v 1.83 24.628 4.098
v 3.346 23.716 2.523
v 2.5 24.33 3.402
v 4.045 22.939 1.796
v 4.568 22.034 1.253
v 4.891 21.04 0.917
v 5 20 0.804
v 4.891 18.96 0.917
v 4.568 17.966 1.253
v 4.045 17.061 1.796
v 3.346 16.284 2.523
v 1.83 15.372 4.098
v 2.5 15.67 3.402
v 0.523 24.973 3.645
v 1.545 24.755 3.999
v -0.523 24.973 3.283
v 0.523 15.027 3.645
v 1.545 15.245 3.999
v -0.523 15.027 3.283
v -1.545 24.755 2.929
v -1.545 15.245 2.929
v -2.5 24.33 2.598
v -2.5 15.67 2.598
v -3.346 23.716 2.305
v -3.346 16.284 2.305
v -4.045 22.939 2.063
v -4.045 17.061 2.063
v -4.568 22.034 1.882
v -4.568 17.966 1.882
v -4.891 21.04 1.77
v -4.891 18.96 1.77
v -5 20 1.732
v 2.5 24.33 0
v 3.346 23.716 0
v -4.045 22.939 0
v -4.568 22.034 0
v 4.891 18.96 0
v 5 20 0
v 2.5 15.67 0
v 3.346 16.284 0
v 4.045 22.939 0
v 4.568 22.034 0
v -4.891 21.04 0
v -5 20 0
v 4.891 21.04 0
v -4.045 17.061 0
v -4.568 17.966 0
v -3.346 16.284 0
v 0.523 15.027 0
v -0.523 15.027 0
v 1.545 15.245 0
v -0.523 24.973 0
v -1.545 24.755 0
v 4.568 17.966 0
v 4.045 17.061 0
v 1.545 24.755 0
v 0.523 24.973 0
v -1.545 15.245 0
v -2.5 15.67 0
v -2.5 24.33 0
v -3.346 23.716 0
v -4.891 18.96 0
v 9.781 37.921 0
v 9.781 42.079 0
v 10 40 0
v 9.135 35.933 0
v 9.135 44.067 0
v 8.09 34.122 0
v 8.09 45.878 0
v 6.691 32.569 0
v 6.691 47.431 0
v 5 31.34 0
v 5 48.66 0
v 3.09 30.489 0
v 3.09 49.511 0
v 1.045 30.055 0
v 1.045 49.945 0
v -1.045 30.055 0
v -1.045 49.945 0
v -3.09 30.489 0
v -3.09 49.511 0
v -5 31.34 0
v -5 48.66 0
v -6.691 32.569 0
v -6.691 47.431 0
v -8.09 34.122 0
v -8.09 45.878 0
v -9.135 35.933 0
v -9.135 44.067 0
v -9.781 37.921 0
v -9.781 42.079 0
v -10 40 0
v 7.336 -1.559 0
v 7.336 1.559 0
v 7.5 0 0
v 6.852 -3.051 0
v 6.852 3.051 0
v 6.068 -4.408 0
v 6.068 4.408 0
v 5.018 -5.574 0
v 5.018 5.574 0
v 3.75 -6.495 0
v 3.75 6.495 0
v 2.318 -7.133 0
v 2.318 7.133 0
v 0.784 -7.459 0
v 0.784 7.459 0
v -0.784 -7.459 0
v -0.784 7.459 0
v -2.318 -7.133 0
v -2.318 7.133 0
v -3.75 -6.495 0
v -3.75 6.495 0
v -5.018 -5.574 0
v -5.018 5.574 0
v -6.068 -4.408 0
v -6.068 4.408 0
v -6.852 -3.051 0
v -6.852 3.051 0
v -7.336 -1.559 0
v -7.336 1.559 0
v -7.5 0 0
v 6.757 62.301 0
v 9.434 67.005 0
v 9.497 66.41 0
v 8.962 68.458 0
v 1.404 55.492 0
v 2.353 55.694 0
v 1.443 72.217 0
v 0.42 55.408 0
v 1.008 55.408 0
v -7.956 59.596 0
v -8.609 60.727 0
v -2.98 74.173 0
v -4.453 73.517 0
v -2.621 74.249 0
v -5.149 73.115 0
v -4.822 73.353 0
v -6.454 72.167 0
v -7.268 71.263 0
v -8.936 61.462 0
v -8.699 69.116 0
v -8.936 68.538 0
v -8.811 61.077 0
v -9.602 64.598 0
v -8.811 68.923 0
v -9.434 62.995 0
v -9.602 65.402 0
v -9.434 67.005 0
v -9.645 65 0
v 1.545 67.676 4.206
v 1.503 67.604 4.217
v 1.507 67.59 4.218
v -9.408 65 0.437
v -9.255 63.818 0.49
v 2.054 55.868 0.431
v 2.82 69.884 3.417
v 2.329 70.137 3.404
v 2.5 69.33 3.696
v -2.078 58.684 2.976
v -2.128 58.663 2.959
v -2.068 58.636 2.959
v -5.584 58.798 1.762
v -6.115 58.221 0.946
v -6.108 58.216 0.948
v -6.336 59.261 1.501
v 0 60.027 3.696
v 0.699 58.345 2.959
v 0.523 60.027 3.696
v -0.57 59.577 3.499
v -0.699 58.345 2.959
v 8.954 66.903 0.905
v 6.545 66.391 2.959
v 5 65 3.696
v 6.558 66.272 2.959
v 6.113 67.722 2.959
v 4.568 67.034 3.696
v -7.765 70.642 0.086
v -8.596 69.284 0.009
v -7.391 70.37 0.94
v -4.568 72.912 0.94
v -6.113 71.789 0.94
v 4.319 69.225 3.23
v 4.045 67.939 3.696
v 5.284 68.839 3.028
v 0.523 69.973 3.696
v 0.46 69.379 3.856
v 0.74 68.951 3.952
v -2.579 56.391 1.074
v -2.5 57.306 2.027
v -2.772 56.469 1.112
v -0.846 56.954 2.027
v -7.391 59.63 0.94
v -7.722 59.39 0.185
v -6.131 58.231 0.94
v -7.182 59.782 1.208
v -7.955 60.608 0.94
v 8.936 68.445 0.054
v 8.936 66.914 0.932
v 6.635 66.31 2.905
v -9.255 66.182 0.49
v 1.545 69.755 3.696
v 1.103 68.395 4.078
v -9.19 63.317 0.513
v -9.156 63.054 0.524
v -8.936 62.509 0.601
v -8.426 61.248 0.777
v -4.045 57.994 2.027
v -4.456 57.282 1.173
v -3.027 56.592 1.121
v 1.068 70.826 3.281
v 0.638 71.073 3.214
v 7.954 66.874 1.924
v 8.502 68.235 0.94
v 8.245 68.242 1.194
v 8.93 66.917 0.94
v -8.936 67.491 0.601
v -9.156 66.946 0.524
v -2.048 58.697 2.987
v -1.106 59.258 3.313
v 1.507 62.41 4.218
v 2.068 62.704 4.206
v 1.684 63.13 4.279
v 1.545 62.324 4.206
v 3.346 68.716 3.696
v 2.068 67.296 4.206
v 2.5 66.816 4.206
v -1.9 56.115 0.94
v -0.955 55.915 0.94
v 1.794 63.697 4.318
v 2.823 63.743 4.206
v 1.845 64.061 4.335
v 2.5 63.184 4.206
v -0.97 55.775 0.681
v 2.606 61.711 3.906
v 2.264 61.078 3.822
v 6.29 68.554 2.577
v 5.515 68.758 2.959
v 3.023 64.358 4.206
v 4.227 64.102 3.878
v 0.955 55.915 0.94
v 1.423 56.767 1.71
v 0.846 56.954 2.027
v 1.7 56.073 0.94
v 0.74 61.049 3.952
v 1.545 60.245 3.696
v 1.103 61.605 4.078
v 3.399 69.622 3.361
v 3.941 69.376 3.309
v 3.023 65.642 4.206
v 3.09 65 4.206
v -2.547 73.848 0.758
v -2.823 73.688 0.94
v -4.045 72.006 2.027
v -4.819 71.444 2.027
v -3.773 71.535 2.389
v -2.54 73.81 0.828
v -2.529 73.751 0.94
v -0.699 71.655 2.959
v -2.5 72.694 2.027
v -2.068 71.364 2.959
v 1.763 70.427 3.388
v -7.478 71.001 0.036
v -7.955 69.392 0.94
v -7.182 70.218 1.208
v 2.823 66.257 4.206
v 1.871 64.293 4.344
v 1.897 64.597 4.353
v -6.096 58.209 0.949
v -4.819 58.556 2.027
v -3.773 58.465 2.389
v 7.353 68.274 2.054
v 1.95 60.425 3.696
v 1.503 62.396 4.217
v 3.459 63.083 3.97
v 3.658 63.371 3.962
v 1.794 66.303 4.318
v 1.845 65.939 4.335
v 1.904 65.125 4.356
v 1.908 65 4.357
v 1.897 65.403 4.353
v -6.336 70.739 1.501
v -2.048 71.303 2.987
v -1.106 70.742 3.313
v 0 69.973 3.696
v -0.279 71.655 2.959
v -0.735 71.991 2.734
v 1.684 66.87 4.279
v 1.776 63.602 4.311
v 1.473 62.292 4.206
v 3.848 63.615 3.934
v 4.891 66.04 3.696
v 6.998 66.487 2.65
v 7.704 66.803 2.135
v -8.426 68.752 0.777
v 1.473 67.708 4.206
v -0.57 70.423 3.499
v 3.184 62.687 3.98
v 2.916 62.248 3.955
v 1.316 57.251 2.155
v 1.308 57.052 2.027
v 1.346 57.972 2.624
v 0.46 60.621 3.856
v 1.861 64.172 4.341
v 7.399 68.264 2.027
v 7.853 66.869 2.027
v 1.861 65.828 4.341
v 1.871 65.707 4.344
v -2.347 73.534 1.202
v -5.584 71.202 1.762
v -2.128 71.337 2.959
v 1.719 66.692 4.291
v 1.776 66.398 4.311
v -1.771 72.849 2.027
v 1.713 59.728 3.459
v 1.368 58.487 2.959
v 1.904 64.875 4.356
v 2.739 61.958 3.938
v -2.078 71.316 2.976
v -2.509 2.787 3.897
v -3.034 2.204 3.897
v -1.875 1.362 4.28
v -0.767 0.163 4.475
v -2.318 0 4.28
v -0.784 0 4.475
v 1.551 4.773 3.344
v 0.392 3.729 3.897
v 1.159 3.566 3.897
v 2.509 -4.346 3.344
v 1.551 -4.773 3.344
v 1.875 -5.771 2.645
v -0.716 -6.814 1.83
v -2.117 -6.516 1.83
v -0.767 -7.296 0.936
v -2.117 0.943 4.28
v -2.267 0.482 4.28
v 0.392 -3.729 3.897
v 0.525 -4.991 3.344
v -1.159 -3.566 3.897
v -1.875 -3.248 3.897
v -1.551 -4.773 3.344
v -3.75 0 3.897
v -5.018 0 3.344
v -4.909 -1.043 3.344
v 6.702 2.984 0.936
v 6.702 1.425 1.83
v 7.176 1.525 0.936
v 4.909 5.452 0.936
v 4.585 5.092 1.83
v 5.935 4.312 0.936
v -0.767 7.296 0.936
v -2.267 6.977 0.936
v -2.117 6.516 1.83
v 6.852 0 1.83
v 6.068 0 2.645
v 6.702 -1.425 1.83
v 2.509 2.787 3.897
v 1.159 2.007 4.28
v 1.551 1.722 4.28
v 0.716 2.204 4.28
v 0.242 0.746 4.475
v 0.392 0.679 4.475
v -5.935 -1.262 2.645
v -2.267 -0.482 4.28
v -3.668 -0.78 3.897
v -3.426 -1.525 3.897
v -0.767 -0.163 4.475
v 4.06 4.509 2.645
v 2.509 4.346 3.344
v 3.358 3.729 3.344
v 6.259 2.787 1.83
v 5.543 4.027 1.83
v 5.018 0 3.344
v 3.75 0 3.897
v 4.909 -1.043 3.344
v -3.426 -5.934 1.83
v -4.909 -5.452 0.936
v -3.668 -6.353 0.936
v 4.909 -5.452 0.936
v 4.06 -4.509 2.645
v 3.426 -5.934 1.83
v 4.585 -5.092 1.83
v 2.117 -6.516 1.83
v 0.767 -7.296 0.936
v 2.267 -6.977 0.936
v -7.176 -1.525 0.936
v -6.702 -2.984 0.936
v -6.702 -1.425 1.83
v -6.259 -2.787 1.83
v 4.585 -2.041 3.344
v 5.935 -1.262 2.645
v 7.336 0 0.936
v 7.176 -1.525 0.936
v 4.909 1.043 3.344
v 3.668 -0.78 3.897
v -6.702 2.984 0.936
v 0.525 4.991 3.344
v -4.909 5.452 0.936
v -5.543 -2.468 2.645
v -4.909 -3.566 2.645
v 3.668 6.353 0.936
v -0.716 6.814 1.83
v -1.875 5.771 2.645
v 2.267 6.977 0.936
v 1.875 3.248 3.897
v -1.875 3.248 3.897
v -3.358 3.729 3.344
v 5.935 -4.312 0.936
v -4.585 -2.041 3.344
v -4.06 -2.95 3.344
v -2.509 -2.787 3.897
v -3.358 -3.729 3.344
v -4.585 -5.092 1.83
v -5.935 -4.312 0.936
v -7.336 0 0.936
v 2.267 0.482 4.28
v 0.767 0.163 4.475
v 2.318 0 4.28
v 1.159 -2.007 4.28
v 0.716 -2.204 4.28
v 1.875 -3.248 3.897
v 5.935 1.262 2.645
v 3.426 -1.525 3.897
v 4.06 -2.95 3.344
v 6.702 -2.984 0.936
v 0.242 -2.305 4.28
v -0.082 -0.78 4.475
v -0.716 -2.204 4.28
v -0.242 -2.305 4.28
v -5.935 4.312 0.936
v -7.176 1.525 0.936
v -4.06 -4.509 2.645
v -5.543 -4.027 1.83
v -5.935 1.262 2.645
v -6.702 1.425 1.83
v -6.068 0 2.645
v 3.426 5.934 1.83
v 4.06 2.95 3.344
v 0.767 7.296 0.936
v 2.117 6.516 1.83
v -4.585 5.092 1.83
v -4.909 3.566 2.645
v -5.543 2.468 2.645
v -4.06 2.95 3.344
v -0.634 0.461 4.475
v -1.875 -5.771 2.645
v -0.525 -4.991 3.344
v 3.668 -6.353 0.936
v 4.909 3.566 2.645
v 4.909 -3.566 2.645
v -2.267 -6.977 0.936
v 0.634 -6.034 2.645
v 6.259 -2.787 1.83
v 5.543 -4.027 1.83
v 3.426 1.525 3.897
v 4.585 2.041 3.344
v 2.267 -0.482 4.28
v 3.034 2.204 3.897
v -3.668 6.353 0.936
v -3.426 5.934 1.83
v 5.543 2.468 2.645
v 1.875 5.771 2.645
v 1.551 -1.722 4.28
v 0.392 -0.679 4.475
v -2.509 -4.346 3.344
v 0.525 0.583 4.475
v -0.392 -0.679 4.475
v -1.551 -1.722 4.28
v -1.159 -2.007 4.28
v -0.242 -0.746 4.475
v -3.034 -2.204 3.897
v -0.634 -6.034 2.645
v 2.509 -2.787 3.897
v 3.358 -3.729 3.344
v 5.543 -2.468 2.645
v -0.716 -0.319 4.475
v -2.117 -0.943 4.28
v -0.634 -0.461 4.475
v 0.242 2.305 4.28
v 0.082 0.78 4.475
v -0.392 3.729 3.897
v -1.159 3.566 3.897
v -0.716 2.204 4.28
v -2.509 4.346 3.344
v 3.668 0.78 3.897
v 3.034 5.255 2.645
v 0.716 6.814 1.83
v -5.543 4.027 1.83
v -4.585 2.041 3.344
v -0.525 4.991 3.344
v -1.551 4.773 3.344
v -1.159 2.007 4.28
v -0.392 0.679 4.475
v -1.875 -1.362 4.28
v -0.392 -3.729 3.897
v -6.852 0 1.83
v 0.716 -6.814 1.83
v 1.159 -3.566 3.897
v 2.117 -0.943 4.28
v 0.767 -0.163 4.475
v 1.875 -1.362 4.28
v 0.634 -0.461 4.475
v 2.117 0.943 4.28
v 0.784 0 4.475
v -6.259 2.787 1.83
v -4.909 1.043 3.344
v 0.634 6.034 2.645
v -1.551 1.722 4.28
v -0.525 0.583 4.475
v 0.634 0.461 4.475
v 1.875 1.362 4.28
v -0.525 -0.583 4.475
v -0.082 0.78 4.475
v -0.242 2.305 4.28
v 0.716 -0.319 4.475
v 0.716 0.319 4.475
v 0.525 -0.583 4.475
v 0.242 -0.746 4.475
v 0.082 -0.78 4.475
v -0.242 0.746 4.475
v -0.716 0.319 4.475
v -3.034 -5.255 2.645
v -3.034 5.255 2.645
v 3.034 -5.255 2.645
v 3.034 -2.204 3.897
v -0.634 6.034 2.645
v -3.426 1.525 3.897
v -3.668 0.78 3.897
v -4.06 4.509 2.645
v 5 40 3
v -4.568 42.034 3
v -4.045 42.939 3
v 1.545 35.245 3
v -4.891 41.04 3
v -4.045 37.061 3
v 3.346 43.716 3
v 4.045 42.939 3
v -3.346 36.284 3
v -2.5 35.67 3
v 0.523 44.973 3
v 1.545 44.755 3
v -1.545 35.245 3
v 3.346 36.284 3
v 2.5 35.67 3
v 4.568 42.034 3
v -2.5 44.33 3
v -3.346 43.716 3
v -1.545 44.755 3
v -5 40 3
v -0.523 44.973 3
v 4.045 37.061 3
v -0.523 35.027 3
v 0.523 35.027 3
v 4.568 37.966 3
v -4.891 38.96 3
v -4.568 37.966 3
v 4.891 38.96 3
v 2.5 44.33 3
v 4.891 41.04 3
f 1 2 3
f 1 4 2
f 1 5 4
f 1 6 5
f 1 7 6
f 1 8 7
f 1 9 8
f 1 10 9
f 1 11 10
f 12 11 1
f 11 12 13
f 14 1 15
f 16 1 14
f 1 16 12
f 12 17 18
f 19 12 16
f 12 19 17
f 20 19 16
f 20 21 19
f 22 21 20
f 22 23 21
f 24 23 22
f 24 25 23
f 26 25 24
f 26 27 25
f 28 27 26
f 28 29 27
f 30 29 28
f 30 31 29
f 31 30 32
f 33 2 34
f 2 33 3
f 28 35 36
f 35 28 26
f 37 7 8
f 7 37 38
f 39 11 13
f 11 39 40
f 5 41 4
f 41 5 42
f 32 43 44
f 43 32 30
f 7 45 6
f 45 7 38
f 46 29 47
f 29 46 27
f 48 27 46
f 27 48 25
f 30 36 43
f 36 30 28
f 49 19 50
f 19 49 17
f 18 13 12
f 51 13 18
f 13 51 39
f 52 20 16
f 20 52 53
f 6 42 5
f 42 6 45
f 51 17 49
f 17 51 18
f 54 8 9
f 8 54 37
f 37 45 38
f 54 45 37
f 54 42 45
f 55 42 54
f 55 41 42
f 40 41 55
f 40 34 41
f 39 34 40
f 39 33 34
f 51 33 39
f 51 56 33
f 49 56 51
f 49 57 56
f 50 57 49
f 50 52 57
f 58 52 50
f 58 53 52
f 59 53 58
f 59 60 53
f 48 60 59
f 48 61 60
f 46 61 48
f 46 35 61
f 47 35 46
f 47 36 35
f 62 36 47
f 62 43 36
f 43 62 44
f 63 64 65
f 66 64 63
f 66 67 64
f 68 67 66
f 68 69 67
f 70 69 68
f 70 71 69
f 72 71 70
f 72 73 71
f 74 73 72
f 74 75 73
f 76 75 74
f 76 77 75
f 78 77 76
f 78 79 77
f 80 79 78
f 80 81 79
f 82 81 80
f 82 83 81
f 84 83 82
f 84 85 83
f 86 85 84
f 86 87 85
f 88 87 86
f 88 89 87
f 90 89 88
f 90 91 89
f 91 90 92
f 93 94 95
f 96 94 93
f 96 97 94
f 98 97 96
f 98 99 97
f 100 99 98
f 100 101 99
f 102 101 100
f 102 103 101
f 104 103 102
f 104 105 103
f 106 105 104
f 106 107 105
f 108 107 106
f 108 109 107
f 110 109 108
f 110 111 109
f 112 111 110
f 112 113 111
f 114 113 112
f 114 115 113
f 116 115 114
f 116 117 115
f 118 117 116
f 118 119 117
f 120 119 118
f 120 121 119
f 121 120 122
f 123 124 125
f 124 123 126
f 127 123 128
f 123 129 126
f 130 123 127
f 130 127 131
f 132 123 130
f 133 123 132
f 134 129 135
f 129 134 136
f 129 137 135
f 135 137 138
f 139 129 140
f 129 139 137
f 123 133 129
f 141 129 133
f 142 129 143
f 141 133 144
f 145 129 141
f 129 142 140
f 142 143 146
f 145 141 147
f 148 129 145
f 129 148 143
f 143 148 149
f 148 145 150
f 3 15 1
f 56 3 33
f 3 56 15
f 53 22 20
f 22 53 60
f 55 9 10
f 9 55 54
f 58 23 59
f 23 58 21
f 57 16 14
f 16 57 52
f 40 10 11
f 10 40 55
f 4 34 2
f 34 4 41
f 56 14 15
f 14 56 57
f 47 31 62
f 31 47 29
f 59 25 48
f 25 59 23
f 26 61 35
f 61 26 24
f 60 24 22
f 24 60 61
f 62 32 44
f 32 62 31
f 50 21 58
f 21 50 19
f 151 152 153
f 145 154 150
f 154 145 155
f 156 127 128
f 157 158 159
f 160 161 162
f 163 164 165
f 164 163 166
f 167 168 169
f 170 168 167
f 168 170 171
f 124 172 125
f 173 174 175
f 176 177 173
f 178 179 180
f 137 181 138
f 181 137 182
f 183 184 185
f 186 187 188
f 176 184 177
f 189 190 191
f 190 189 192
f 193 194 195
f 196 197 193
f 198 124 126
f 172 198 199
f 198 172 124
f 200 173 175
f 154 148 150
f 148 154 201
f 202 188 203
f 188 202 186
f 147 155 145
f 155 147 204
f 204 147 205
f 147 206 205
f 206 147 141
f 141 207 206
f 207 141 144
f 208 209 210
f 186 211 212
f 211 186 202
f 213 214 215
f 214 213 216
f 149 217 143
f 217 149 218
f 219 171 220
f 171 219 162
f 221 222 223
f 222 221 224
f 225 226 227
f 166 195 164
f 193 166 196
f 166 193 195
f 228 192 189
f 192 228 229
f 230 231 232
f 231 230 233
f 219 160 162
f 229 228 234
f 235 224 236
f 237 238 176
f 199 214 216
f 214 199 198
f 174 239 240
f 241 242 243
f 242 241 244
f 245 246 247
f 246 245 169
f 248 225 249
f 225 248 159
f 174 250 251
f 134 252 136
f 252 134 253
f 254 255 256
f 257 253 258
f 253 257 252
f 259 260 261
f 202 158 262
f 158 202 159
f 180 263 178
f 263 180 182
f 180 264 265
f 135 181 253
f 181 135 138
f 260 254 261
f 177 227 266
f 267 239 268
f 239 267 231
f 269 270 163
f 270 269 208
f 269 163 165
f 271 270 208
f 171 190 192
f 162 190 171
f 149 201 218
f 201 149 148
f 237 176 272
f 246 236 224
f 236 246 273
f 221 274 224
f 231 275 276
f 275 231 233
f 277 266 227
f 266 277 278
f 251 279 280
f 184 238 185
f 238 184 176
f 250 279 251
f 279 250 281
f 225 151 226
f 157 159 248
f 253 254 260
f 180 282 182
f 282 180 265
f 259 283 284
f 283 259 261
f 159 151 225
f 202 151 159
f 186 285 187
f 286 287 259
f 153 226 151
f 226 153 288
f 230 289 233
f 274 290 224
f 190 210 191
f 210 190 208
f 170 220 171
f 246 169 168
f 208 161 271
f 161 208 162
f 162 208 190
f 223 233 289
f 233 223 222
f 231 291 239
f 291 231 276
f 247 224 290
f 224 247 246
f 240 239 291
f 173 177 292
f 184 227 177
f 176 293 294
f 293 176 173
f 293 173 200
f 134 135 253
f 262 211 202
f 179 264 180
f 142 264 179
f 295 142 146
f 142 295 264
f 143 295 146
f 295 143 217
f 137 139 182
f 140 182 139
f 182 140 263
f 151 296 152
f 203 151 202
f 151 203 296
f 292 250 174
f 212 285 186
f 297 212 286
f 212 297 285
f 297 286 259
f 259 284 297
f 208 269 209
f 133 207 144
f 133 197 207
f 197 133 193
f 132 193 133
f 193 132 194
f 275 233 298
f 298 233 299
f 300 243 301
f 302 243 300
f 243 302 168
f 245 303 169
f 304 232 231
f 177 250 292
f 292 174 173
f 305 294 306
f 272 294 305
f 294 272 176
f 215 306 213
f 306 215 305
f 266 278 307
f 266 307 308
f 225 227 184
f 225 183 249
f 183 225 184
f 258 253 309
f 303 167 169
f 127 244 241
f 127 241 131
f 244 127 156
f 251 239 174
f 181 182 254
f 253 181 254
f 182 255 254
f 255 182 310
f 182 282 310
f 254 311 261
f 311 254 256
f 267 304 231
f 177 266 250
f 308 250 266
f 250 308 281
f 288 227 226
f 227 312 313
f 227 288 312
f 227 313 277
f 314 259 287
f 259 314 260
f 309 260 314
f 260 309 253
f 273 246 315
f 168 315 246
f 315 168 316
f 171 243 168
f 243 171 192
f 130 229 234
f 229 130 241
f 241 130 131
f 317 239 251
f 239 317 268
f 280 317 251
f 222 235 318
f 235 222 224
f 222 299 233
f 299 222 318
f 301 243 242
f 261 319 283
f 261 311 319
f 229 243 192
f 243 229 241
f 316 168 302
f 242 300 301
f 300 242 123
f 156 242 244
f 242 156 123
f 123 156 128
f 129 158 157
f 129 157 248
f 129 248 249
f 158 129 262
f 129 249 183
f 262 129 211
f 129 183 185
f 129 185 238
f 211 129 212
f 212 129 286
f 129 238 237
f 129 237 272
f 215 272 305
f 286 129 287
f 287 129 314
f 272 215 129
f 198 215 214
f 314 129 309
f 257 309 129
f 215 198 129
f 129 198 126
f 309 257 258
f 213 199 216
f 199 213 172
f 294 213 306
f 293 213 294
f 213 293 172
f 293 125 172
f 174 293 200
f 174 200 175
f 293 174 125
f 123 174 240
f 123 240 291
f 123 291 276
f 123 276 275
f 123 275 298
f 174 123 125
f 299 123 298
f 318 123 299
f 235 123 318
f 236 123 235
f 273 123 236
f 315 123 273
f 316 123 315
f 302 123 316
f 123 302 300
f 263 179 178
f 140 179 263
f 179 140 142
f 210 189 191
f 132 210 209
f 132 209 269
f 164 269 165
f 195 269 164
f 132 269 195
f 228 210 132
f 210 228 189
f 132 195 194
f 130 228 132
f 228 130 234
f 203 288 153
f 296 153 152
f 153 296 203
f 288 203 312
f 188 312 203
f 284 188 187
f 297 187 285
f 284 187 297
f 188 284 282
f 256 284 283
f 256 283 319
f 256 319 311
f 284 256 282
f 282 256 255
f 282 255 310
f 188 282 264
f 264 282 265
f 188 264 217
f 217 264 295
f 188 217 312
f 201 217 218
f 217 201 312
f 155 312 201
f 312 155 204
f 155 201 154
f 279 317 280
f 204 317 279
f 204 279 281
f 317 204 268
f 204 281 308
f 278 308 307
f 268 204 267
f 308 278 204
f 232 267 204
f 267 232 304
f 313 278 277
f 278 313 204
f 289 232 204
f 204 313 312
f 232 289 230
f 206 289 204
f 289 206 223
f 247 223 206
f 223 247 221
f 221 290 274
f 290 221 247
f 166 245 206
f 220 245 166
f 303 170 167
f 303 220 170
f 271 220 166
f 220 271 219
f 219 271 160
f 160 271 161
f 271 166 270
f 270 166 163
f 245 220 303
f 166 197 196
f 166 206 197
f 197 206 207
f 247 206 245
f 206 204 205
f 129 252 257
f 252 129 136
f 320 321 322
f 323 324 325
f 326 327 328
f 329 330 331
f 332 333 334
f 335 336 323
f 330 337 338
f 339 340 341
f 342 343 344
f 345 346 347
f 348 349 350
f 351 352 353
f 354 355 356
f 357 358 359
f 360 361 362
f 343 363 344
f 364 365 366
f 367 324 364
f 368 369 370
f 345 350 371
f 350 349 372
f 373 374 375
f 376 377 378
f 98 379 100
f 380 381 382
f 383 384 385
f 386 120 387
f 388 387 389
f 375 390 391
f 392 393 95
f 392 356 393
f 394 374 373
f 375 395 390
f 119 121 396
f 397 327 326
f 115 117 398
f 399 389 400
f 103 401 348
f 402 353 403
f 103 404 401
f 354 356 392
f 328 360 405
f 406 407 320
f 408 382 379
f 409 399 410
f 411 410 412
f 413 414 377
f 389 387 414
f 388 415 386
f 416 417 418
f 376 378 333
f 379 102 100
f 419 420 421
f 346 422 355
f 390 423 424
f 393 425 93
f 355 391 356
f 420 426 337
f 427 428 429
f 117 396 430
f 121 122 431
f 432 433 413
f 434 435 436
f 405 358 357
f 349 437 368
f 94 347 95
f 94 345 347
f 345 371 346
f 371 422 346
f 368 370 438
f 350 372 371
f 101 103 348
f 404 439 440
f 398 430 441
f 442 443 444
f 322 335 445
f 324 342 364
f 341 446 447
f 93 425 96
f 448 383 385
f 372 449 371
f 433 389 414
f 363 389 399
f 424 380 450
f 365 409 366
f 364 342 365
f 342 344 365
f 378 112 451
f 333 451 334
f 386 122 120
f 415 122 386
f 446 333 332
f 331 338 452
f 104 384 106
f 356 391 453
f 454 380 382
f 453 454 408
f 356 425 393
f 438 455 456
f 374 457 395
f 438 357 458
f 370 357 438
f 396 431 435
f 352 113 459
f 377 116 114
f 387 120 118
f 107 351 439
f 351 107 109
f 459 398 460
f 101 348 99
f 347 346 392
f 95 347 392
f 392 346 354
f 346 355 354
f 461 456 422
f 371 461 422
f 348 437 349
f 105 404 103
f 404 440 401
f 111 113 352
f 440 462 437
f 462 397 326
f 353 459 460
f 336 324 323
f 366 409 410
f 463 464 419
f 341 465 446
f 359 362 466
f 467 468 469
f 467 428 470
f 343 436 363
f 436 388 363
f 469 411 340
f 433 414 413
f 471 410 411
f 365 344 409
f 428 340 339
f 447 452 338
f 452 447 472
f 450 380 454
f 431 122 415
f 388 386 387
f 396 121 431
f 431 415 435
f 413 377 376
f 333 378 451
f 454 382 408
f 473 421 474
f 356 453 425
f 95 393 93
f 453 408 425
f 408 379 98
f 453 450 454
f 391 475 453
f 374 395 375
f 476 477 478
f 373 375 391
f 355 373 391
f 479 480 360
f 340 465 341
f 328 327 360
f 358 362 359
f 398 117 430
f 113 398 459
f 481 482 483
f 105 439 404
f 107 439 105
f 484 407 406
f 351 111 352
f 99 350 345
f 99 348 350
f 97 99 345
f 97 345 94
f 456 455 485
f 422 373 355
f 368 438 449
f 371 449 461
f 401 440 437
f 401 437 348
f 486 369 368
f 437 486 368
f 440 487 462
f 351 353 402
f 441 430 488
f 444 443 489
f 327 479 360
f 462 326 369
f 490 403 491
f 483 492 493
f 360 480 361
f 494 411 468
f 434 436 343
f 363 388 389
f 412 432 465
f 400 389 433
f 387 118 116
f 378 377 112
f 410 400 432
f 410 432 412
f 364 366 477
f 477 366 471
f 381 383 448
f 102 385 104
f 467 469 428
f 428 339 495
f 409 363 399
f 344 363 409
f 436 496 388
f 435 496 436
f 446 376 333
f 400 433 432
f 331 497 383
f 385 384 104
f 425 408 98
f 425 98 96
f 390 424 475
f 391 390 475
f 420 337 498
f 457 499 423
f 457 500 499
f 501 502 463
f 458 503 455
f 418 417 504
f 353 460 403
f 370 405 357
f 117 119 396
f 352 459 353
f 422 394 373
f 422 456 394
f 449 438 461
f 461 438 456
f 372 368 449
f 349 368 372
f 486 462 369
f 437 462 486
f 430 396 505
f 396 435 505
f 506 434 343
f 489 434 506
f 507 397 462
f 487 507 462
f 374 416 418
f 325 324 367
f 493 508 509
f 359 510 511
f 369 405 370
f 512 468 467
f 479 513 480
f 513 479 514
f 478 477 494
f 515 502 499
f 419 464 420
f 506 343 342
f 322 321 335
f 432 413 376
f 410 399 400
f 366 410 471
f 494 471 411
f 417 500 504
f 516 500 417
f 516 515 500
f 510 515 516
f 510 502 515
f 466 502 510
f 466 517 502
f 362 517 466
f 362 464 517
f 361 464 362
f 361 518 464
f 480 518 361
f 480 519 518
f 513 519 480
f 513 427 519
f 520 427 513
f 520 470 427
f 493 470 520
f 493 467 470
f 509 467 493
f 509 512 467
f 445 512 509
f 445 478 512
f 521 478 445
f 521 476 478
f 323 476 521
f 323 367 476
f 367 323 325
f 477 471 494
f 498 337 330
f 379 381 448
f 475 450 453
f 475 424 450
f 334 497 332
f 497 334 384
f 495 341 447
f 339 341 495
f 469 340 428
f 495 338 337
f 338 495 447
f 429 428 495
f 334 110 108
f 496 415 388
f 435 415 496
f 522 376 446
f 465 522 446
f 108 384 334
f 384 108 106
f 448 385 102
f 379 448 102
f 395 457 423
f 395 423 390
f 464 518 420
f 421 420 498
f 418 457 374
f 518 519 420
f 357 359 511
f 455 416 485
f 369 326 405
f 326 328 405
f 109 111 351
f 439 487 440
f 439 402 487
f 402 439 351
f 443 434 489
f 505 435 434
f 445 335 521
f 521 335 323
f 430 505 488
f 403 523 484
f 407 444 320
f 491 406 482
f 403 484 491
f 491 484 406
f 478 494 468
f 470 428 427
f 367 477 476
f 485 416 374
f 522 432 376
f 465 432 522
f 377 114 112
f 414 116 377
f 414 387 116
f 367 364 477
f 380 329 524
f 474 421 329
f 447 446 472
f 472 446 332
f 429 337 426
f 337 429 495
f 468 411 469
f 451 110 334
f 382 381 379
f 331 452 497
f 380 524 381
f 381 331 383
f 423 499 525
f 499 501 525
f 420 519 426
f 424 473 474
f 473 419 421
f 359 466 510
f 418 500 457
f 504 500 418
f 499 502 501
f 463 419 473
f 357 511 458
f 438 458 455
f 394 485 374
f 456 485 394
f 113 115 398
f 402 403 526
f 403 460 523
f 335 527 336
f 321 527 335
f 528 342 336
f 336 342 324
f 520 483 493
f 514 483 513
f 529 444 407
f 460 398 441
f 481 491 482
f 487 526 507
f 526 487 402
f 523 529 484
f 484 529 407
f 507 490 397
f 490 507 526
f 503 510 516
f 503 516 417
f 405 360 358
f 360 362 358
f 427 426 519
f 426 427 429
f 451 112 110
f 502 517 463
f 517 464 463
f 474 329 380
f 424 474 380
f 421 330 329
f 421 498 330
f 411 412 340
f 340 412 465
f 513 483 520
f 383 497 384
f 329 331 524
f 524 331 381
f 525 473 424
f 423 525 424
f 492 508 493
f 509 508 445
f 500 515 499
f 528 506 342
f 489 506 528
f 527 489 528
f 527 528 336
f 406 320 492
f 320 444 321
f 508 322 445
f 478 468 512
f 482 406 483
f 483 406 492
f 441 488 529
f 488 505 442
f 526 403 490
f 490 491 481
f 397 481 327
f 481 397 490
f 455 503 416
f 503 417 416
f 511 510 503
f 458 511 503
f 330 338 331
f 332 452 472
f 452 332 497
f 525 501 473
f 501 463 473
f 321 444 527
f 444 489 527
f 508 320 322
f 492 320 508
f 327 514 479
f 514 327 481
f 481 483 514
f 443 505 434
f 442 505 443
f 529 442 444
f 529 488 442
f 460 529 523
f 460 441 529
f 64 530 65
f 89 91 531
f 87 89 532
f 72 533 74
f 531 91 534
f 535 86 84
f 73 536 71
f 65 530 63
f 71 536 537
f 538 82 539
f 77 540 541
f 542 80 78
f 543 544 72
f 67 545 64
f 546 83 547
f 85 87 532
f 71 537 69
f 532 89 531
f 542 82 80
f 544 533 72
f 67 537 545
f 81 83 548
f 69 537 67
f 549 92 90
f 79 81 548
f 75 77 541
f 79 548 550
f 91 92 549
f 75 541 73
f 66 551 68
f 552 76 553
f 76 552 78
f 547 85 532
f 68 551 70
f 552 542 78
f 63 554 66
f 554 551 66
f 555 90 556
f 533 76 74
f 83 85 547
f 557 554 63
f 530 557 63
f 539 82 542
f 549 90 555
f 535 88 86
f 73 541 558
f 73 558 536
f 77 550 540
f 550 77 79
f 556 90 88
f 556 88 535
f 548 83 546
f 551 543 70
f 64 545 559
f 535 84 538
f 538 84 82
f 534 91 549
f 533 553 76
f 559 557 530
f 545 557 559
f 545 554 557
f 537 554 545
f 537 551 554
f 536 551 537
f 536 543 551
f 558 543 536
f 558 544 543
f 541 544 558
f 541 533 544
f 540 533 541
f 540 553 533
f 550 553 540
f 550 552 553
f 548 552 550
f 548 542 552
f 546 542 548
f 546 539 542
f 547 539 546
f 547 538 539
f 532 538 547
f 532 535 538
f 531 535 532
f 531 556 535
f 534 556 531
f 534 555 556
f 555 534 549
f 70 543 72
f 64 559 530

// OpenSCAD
// example scene for pycam

module scene() {
    sphere(r=15, center=true);
    translate(v=[0,80,5]) cylinder(h = 10, r1 = 20, r2 = 10, center = true);
    translate(v=[0,40,15]) {
      intersection() {
        translate([0,0,-15]) rotate([60,0,90]) cube([30, 20, 20], center=true);
        cylinder(h = 30, r = 10, center = true);
      }
    }
    translate([0,130,-5]) {
      intersection() {
        sphere(20, center=true);
        rotate([30,60,0]) cube(30, center=true);
      }
    }
}

// remove the parts of the objects below the zero plane
difference() {
  scale([0.5, 0.5, 0.3]) scene();
  translate([0,0,-20]) cube([200,200,40], center=true);
}
